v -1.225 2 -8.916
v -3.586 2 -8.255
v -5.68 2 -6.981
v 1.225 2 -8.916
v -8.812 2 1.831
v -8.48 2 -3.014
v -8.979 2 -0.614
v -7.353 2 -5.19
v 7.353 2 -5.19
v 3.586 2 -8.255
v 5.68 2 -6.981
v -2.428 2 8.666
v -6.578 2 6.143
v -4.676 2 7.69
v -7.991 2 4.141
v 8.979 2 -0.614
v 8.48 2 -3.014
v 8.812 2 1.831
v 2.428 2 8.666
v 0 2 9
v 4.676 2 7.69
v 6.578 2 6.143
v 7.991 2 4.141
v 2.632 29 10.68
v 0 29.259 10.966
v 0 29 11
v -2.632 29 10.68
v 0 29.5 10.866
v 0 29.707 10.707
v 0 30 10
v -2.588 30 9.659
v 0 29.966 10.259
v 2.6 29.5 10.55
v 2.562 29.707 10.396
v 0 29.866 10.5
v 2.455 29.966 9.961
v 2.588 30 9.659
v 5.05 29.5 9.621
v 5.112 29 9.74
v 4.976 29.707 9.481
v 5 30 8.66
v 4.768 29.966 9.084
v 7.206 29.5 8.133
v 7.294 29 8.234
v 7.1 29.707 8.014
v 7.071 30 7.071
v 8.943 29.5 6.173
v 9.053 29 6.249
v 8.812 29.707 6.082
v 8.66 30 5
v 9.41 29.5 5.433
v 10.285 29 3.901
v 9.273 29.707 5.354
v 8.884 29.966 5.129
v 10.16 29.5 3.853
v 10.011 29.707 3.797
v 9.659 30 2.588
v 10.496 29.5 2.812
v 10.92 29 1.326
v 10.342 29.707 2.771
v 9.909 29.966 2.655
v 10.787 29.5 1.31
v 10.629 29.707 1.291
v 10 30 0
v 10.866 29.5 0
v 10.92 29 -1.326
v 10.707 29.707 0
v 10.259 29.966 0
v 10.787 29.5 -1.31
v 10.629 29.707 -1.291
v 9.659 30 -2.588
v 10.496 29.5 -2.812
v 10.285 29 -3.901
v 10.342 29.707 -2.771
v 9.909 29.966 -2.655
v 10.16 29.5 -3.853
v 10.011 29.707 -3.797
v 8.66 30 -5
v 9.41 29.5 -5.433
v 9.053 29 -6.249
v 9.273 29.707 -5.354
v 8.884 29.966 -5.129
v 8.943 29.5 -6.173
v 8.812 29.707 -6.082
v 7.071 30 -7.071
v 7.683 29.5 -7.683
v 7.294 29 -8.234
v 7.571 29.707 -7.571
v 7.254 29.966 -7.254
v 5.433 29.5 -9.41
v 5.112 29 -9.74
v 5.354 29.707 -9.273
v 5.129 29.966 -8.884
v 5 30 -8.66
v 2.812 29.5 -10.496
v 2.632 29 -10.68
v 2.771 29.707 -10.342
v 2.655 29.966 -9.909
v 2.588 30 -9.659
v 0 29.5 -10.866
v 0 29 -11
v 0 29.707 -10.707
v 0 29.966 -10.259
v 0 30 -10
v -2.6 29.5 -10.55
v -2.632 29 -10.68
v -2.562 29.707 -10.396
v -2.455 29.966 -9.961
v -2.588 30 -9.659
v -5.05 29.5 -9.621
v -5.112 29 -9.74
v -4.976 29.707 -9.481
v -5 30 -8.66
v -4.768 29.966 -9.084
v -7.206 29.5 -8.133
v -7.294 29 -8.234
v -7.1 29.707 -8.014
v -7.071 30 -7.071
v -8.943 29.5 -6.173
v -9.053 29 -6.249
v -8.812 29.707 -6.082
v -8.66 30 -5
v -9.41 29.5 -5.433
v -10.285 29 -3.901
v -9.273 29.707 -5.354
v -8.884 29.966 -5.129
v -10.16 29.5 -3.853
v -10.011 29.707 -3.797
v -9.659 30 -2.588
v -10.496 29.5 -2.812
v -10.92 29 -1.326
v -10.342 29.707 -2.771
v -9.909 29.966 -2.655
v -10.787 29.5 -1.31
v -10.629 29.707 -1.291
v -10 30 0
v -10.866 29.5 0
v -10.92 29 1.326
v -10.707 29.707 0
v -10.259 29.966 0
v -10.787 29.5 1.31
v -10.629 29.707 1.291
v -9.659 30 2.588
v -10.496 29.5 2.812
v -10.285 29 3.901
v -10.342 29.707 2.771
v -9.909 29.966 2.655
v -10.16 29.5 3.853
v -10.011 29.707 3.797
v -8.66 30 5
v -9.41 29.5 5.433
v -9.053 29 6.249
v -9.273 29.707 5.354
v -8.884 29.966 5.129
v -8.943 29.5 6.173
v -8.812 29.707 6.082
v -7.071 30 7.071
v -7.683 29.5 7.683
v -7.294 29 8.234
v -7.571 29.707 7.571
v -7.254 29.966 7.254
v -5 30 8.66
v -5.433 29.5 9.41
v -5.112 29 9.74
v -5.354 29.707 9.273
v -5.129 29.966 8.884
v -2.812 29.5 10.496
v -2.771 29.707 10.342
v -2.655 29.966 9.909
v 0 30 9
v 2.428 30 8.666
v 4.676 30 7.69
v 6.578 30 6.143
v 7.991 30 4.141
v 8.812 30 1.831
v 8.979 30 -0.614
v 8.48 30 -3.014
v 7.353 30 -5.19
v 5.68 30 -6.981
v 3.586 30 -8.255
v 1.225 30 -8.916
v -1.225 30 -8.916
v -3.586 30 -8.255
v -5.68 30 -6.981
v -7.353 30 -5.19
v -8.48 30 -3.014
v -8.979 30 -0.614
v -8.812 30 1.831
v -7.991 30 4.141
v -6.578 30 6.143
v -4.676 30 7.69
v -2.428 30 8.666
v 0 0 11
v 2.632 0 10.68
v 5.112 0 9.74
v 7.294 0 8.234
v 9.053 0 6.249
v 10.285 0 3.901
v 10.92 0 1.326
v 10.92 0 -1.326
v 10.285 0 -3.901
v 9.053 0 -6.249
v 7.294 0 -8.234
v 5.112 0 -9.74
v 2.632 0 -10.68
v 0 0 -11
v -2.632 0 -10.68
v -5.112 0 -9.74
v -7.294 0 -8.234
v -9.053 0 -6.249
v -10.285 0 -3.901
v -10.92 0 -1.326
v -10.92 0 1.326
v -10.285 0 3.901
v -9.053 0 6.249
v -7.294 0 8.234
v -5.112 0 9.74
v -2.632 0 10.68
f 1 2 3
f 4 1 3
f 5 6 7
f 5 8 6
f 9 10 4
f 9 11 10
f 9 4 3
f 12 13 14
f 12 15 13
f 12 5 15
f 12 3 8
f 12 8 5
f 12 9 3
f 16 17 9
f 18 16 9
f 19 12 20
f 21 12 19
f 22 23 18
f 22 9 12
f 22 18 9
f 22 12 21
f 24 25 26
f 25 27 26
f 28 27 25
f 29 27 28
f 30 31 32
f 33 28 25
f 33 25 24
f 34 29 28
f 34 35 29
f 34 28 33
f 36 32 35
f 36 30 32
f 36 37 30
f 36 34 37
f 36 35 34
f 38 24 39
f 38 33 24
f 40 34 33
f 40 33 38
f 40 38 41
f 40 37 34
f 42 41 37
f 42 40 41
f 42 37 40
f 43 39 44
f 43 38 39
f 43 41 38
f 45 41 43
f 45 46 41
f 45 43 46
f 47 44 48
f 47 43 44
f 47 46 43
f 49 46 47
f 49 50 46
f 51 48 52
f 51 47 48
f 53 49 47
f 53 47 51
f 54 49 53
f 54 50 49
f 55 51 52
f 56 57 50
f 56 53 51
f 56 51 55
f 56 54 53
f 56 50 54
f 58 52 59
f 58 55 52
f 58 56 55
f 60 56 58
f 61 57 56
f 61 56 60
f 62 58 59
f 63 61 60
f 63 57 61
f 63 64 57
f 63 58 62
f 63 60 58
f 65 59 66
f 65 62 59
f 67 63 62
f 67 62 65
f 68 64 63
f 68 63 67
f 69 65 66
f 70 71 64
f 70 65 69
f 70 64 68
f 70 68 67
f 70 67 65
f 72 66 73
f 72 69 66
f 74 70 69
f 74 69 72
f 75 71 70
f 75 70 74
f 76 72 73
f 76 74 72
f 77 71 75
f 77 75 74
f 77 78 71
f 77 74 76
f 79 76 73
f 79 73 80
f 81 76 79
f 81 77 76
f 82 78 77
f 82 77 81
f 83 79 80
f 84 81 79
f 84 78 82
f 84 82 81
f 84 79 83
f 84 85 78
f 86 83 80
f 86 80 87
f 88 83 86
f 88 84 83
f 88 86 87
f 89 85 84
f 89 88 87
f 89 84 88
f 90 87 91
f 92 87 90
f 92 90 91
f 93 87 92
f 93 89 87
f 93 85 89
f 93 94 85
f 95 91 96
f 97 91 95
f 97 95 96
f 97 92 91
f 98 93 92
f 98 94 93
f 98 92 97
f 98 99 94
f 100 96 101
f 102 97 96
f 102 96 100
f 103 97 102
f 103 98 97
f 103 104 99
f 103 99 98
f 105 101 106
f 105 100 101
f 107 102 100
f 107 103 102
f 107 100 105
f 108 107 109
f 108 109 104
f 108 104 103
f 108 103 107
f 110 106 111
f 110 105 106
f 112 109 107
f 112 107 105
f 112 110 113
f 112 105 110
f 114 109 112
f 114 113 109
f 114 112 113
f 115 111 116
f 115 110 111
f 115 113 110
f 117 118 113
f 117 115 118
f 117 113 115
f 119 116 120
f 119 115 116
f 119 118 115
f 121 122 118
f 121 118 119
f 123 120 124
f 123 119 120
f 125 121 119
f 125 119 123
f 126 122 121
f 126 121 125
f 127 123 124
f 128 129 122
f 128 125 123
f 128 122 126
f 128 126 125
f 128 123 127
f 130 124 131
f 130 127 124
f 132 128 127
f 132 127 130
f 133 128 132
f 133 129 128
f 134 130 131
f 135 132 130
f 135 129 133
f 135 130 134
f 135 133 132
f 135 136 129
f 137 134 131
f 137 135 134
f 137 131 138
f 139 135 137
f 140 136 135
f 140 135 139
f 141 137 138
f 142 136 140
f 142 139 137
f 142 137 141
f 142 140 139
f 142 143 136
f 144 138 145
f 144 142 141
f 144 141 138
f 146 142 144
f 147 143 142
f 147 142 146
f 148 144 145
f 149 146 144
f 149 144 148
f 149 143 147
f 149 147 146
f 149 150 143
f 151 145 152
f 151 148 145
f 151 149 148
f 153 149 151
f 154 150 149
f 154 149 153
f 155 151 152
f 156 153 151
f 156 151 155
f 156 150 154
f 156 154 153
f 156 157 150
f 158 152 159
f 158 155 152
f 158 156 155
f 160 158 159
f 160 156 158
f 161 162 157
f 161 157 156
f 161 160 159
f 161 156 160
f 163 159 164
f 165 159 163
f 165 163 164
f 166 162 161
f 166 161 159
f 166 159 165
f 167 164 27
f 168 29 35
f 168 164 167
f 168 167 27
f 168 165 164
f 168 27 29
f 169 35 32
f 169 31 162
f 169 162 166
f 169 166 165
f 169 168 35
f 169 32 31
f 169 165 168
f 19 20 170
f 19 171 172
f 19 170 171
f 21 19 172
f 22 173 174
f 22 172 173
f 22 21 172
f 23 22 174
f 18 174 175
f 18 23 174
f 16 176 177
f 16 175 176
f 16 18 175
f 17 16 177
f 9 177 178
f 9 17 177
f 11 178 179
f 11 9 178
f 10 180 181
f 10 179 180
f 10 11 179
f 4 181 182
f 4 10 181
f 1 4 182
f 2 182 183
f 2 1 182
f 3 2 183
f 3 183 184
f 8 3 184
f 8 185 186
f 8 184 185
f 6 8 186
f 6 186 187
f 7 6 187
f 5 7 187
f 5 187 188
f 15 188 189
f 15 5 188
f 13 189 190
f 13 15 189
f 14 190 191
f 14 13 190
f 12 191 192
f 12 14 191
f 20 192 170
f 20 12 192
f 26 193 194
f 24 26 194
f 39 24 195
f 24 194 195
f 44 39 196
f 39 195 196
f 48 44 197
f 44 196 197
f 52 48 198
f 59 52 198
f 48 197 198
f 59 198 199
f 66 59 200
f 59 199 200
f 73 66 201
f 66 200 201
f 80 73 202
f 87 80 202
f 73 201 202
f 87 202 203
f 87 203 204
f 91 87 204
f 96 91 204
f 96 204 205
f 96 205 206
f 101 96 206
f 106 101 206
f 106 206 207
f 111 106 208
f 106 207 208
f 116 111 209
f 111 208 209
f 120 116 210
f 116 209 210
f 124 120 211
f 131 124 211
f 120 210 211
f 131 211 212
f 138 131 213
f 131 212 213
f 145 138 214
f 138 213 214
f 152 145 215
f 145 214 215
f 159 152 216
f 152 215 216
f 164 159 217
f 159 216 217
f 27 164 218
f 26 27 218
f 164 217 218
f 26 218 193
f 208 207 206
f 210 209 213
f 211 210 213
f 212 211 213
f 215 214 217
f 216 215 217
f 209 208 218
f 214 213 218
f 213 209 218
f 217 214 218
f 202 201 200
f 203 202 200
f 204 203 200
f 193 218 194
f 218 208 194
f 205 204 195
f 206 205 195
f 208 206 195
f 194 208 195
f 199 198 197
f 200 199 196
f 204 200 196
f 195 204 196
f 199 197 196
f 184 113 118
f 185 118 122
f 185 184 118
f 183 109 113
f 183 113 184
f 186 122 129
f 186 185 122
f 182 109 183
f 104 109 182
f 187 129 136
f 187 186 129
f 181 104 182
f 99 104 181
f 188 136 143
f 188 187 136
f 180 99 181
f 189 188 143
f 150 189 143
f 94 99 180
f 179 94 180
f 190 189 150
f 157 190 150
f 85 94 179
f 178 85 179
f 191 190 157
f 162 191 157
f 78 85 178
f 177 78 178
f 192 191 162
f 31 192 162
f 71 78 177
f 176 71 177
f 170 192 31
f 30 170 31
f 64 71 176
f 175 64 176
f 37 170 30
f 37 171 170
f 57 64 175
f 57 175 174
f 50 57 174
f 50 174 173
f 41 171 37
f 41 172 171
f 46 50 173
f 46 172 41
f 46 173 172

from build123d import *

# Parameters (mm, degrees)
ESBO_O1_R                = 11
RESSALTO_EXTRUS_O1_DEPTH = 30
CASCA1_T                 = -2
FILETE1_R                = 1


with BuildPart() as part:
    # Esboço1 → Ressalto-extrusão1 (new body)
    with BuildSketch(Plane(origin=(0, 0, 0), x_dir=(1, 0, 0), z_dir=(0, 1, 0))):
        with Locations(Location((0, 0, 0), (0, 0, 270))):  # turned: the seam where the file's is
            Circle(ESBO_O1_R)
    extrude(amount=RESSALTO_EXTRUS_O1_DEPTH)

    # Casca1
    casca1_openings = [part.faces().sort_by_distance(p)[0] for p in [
        (0, 30, 0),
    ]]
    offset(amount=CASCA1_T, openings=casca1_openings, kind=Kind.INTERSECTION)

    # Filete1
    filete1_edges = [part.edges().sort_by_distance(p)[0] for p in [
        (0, 30, -11),
    ]]
    fillet(filete1_edges, radius=FILETE1_R)


solid = part.part
